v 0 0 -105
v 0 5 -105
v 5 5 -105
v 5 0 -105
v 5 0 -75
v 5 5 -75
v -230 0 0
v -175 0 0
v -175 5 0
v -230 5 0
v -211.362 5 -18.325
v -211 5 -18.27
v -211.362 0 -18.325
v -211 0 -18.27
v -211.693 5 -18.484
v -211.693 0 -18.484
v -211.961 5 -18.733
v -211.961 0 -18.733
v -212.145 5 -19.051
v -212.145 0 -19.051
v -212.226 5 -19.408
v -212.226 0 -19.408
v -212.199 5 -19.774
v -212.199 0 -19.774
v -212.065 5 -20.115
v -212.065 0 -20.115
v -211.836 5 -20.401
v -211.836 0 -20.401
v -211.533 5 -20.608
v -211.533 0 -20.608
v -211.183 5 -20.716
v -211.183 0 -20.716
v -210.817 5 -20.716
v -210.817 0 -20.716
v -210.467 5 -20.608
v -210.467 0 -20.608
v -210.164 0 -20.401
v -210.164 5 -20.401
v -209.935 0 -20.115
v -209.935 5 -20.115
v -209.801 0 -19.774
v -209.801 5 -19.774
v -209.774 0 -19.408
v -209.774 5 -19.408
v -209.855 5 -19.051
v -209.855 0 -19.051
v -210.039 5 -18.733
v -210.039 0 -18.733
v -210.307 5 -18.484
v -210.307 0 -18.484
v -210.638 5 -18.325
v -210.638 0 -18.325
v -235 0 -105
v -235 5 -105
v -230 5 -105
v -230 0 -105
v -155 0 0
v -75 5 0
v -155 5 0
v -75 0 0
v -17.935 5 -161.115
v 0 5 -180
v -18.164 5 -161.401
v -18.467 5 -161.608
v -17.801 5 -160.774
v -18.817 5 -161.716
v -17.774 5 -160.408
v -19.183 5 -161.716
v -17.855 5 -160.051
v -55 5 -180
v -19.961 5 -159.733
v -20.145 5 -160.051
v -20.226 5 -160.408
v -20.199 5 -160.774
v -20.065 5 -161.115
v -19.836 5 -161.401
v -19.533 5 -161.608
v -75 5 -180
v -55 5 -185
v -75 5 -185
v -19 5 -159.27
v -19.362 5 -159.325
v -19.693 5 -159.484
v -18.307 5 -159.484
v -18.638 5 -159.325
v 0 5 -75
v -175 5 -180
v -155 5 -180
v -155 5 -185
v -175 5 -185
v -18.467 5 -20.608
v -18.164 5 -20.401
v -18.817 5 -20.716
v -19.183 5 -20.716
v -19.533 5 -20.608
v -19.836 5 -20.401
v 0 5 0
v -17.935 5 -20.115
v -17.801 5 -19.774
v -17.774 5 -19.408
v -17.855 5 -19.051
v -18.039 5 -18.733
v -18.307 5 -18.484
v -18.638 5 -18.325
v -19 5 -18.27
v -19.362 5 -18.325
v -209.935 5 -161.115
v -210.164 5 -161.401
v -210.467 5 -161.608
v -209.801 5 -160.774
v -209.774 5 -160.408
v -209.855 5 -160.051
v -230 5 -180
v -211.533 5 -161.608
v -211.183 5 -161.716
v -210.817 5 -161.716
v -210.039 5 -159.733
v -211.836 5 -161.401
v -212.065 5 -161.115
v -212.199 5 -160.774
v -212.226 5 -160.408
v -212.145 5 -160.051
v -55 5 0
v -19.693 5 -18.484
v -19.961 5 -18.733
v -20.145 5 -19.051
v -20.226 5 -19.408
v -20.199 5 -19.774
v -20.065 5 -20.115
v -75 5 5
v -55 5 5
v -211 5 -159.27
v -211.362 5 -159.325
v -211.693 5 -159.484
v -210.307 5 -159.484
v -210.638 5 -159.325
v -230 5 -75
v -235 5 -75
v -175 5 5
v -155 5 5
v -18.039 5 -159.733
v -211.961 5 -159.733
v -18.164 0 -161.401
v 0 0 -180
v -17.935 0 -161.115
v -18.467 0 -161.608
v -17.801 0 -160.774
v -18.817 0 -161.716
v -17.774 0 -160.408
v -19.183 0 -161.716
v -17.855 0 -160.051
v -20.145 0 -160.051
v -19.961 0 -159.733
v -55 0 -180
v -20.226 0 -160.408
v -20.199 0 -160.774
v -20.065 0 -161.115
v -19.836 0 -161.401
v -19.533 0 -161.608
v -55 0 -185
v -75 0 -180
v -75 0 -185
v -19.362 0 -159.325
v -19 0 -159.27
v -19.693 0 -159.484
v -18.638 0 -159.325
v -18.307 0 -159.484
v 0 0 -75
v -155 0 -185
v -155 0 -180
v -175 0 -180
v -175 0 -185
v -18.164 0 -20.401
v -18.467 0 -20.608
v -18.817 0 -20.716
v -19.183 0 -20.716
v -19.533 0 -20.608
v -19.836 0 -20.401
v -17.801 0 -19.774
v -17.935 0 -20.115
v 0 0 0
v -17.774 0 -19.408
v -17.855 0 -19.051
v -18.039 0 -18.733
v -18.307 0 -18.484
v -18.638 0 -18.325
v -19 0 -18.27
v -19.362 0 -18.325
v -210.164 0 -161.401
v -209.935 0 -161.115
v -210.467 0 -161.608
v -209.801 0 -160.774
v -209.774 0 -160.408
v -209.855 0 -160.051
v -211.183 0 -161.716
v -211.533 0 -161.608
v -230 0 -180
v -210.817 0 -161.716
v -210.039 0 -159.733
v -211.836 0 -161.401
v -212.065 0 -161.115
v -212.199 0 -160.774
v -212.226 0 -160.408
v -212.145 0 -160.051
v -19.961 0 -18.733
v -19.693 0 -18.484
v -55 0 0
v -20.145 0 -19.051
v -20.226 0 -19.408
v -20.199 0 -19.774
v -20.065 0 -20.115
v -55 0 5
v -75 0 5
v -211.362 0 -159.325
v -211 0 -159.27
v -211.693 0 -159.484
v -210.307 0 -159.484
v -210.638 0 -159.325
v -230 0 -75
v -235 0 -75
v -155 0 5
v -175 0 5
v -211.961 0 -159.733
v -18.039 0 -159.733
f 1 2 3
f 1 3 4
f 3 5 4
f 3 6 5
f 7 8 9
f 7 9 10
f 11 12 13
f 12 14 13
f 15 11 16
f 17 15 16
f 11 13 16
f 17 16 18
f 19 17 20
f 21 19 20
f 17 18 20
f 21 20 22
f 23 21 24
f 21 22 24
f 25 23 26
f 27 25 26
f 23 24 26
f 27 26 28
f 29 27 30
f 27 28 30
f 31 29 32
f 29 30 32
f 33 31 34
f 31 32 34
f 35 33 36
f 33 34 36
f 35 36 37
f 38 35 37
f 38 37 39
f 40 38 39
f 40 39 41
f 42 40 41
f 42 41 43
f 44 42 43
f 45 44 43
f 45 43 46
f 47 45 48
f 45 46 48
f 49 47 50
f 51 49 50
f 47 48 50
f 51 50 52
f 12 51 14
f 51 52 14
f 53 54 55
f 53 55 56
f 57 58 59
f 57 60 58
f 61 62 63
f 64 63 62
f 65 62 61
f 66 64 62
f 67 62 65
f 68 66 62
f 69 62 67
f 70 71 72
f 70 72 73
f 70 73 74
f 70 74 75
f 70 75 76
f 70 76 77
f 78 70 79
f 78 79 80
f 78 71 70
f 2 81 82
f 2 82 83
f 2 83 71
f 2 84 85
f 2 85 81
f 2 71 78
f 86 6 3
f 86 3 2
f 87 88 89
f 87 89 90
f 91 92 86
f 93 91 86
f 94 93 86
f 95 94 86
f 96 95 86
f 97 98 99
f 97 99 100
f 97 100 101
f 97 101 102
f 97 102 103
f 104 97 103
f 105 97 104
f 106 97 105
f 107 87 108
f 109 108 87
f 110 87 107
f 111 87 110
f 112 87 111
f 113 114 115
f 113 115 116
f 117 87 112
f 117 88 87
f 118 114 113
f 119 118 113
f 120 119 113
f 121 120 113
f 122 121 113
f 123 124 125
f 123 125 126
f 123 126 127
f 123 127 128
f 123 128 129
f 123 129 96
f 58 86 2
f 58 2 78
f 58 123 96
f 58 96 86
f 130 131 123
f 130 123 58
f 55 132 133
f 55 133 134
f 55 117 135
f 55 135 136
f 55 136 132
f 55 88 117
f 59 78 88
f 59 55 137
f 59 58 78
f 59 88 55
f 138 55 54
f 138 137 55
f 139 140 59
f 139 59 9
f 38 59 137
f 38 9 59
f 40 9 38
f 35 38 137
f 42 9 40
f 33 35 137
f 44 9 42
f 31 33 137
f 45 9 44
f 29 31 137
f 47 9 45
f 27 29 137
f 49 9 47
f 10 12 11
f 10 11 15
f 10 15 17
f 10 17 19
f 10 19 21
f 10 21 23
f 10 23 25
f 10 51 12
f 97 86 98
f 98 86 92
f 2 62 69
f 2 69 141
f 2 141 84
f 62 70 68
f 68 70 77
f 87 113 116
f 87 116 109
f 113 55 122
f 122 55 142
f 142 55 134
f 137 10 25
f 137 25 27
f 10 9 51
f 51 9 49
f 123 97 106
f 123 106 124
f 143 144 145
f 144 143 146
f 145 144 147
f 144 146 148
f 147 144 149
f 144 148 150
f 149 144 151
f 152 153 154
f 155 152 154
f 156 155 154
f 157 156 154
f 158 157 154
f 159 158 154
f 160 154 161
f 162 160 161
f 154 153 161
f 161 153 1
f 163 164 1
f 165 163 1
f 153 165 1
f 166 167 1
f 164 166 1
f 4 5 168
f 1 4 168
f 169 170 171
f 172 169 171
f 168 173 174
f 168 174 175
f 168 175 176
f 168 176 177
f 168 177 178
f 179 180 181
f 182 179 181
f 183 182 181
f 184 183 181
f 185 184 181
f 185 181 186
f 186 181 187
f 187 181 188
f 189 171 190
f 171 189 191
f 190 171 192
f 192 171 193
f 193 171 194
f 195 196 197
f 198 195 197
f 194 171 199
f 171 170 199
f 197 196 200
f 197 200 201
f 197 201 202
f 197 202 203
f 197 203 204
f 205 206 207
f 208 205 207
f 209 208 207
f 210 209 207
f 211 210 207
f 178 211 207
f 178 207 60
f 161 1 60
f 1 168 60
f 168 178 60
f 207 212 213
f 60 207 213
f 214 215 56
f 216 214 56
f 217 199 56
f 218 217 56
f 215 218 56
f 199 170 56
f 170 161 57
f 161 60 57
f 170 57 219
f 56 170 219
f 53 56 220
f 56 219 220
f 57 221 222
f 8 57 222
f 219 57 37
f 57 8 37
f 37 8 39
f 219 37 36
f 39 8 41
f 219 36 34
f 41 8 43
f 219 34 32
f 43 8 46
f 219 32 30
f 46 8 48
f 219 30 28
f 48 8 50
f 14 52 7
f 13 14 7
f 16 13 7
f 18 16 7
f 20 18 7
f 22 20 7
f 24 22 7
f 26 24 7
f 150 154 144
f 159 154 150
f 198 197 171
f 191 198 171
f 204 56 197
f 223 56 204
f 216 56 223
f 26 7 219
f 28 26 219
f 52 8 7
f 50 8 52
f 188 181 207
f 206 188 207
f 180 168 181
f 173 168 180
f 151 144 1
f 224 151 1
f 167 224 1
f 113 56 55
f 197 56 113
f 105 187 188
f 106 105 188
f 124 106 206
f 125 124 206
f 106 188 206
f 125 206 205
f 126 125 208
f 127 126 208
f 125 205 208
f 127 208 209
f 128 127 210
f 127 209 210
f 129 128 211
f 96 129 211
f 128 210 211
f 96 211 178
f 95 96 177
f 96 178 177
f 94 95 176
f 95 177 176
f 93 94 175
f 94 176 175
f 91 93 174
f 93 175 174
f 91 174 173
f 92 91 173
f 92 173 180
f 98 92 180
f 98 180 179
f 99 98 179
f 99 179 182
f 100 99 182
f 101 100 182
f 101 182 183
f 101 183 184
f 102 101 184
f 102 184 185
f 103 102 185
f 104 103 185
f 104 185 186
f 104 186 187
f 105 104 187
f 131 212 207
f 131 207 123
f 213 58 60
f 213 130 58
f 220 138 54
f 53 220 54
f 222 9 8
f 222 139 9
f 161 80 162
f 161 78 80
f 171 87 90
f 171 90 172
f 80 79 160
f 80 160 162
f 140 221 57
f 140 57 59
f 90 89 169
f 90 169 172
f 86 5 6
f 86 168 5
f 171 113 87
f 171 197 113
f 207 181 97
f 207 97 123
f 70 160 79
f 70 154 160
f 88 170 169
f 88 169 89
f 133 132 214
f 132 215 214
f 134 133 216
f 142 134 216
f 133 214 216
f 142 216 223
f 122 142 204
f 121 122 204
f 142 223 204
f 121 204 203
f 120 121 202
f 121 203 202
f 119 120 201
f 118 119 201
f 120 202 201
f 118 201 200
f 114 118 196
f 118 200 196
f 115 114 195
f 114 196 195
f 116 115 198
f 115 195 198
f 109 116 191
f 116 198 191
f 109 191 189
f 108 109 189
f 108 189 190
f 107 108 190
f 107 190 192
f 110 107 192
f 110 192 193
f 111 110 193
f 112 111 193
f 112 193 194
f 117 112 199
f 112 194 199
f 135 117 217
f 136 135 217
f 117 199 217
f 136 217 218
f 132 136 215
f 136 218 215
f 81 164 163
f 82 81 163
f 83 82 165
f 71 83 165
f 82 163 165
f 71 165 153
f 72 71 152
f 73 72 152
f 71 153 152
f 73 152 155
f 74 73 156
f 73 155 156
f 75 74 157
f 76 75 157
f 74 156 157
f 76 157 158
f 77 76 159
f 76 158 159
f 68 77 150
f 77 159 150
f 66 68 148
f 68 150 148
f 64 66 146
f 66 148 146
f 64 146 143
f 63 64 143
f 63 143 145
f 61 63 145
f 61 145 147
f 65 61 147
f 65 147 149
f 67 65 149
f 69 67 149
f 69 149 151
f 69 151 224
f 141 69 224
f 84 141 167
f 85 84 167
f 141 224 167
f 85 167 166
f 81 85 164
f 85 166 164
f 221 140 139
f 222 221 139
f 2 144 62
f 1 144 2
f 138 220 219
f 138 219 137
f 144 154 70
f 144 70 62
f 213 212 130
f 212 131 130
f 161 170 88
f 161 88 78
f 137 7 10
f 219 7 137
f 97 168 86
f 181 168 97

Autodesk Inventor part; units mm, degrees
ref_plane "YZ Plane" through (0, 0, 0) normal (1, 0, 0) x (0, 1, 0)
ref_plane "XZ Plane" through (0, 0, 0) normal (0, 1, 0) x (-1, 0, 0)
ref_plane "XY Plane" through (0, 0, 0) normal (0, 0, 1) x (1, 0, 0)
sketch "Sketch1" plane through (0, 0, 0) normal (0, 1, 0) x (-1, 0, 0)
  line L0 (0, 0) -> (230, 0)
  line L1 (230, 0) -> (230, -180)
  line L2 (230, -180) -> (0, -180)
  line L3 (0, -180) -> (0, 0)
  dimension "d0" = 180
  dimension "d1" = 230
extrude "Extrusion1" add sketch "Sketch1" along normal blind 5
sketch "Sketch2" plane through (0, 0, -180) normal (0, 0, -1) x (-1, 0, 0)
  line L0 (0, 5) -> (230, 5) projected
  line L1 (55, 5) -> (75, 5)
  line L2 (75, 5) -> (75, 0)
  line L3 (75, 0) -> (55, 0)
  line L4 (55, 0) -> (55, 5)
  line L5 (0, 0) -> (230, 0) projected
  line L6 (155, 5) -> (175, 5)
  line L7 (175, 5) -> (175, 0)
  line L8 (175, 0) -> (155, 0)
  line L9 (155, 0) -> (155, 5)
  line L10 (0, 0) -> (0, 5) projected
  line L11 (230, 0) -> (230, 5) projected
  point P0 (175, 2.5)
  point P1 (155, 2.5)
  point P2 (230, 2.5)
  dimension "d4" = 20
  dimension "d5" = 20
  dimension "d6" = 80
  dimension "d7" = 55
  dimension "d8" = 55
extrude "Extrusion2" add sketch "Sketch2" along normal blind 5 and the other way blind 185 contours L0 L2 L3 L4 | L0 L7 L5 L9
sketch "Sketch3" plane through (0, 0, 0) normal (1, 0, 0) x (0, 0, -1)
  line L0 (0, 5) -> (180, 5) projected
  line L1 (0, 0) -> (180, 0) projected
  line L2 (75, 5) -> (105, 5)
  line L3 (105, 5) -> (105, 0)
  line L4 (105, 0) -> (75, 0)
  line L5 (75, 0) -> (75, 5)
  line L6 (180, 0) -> (180, 5) projected
  point P0 (180, 2.5)
  dimension "d13" = 30
  dimension "d14" = 75
extrude "Extrusion3" add sketch "Sketch3" along normal blind 5 and the other way blind 235 contours L0 L3 L1 L5
sketch "Sketch4" plane through (0, 5, 0) normal (0, 1, 0) x (1, 0, 0)
  line L0 (-230, 75) -> (-230, 0) projected
  line L1 (0, 180) -> (-55, 180) projected
  point P0 (0, 0)
  point P1 (-211, 160.5)
  point P2 (-19, 160.5)
  point P3 (-19, 19.5)
  point P4 (-211, 19.5)
  point P5 (-230, 37.5)
  dimension "d19" = 141
  dimension "d20" = 192
  dimension "d21" = 19
  dimension "d22" = 141
  dimension "d23" = 0
  dimension "d24" = 19.5
hole "Hole1" at (-211, 5, -160.5) at (-19, 5, -160.5) at (-19, 5, -19.5) at (-211, 5, -19.5) direction (0, -1, 0) diameter 2.459 end through all thread size "M3x0.5" class "6H" standard "ANSI Metric M Profile"
properties part number "onderkant"
